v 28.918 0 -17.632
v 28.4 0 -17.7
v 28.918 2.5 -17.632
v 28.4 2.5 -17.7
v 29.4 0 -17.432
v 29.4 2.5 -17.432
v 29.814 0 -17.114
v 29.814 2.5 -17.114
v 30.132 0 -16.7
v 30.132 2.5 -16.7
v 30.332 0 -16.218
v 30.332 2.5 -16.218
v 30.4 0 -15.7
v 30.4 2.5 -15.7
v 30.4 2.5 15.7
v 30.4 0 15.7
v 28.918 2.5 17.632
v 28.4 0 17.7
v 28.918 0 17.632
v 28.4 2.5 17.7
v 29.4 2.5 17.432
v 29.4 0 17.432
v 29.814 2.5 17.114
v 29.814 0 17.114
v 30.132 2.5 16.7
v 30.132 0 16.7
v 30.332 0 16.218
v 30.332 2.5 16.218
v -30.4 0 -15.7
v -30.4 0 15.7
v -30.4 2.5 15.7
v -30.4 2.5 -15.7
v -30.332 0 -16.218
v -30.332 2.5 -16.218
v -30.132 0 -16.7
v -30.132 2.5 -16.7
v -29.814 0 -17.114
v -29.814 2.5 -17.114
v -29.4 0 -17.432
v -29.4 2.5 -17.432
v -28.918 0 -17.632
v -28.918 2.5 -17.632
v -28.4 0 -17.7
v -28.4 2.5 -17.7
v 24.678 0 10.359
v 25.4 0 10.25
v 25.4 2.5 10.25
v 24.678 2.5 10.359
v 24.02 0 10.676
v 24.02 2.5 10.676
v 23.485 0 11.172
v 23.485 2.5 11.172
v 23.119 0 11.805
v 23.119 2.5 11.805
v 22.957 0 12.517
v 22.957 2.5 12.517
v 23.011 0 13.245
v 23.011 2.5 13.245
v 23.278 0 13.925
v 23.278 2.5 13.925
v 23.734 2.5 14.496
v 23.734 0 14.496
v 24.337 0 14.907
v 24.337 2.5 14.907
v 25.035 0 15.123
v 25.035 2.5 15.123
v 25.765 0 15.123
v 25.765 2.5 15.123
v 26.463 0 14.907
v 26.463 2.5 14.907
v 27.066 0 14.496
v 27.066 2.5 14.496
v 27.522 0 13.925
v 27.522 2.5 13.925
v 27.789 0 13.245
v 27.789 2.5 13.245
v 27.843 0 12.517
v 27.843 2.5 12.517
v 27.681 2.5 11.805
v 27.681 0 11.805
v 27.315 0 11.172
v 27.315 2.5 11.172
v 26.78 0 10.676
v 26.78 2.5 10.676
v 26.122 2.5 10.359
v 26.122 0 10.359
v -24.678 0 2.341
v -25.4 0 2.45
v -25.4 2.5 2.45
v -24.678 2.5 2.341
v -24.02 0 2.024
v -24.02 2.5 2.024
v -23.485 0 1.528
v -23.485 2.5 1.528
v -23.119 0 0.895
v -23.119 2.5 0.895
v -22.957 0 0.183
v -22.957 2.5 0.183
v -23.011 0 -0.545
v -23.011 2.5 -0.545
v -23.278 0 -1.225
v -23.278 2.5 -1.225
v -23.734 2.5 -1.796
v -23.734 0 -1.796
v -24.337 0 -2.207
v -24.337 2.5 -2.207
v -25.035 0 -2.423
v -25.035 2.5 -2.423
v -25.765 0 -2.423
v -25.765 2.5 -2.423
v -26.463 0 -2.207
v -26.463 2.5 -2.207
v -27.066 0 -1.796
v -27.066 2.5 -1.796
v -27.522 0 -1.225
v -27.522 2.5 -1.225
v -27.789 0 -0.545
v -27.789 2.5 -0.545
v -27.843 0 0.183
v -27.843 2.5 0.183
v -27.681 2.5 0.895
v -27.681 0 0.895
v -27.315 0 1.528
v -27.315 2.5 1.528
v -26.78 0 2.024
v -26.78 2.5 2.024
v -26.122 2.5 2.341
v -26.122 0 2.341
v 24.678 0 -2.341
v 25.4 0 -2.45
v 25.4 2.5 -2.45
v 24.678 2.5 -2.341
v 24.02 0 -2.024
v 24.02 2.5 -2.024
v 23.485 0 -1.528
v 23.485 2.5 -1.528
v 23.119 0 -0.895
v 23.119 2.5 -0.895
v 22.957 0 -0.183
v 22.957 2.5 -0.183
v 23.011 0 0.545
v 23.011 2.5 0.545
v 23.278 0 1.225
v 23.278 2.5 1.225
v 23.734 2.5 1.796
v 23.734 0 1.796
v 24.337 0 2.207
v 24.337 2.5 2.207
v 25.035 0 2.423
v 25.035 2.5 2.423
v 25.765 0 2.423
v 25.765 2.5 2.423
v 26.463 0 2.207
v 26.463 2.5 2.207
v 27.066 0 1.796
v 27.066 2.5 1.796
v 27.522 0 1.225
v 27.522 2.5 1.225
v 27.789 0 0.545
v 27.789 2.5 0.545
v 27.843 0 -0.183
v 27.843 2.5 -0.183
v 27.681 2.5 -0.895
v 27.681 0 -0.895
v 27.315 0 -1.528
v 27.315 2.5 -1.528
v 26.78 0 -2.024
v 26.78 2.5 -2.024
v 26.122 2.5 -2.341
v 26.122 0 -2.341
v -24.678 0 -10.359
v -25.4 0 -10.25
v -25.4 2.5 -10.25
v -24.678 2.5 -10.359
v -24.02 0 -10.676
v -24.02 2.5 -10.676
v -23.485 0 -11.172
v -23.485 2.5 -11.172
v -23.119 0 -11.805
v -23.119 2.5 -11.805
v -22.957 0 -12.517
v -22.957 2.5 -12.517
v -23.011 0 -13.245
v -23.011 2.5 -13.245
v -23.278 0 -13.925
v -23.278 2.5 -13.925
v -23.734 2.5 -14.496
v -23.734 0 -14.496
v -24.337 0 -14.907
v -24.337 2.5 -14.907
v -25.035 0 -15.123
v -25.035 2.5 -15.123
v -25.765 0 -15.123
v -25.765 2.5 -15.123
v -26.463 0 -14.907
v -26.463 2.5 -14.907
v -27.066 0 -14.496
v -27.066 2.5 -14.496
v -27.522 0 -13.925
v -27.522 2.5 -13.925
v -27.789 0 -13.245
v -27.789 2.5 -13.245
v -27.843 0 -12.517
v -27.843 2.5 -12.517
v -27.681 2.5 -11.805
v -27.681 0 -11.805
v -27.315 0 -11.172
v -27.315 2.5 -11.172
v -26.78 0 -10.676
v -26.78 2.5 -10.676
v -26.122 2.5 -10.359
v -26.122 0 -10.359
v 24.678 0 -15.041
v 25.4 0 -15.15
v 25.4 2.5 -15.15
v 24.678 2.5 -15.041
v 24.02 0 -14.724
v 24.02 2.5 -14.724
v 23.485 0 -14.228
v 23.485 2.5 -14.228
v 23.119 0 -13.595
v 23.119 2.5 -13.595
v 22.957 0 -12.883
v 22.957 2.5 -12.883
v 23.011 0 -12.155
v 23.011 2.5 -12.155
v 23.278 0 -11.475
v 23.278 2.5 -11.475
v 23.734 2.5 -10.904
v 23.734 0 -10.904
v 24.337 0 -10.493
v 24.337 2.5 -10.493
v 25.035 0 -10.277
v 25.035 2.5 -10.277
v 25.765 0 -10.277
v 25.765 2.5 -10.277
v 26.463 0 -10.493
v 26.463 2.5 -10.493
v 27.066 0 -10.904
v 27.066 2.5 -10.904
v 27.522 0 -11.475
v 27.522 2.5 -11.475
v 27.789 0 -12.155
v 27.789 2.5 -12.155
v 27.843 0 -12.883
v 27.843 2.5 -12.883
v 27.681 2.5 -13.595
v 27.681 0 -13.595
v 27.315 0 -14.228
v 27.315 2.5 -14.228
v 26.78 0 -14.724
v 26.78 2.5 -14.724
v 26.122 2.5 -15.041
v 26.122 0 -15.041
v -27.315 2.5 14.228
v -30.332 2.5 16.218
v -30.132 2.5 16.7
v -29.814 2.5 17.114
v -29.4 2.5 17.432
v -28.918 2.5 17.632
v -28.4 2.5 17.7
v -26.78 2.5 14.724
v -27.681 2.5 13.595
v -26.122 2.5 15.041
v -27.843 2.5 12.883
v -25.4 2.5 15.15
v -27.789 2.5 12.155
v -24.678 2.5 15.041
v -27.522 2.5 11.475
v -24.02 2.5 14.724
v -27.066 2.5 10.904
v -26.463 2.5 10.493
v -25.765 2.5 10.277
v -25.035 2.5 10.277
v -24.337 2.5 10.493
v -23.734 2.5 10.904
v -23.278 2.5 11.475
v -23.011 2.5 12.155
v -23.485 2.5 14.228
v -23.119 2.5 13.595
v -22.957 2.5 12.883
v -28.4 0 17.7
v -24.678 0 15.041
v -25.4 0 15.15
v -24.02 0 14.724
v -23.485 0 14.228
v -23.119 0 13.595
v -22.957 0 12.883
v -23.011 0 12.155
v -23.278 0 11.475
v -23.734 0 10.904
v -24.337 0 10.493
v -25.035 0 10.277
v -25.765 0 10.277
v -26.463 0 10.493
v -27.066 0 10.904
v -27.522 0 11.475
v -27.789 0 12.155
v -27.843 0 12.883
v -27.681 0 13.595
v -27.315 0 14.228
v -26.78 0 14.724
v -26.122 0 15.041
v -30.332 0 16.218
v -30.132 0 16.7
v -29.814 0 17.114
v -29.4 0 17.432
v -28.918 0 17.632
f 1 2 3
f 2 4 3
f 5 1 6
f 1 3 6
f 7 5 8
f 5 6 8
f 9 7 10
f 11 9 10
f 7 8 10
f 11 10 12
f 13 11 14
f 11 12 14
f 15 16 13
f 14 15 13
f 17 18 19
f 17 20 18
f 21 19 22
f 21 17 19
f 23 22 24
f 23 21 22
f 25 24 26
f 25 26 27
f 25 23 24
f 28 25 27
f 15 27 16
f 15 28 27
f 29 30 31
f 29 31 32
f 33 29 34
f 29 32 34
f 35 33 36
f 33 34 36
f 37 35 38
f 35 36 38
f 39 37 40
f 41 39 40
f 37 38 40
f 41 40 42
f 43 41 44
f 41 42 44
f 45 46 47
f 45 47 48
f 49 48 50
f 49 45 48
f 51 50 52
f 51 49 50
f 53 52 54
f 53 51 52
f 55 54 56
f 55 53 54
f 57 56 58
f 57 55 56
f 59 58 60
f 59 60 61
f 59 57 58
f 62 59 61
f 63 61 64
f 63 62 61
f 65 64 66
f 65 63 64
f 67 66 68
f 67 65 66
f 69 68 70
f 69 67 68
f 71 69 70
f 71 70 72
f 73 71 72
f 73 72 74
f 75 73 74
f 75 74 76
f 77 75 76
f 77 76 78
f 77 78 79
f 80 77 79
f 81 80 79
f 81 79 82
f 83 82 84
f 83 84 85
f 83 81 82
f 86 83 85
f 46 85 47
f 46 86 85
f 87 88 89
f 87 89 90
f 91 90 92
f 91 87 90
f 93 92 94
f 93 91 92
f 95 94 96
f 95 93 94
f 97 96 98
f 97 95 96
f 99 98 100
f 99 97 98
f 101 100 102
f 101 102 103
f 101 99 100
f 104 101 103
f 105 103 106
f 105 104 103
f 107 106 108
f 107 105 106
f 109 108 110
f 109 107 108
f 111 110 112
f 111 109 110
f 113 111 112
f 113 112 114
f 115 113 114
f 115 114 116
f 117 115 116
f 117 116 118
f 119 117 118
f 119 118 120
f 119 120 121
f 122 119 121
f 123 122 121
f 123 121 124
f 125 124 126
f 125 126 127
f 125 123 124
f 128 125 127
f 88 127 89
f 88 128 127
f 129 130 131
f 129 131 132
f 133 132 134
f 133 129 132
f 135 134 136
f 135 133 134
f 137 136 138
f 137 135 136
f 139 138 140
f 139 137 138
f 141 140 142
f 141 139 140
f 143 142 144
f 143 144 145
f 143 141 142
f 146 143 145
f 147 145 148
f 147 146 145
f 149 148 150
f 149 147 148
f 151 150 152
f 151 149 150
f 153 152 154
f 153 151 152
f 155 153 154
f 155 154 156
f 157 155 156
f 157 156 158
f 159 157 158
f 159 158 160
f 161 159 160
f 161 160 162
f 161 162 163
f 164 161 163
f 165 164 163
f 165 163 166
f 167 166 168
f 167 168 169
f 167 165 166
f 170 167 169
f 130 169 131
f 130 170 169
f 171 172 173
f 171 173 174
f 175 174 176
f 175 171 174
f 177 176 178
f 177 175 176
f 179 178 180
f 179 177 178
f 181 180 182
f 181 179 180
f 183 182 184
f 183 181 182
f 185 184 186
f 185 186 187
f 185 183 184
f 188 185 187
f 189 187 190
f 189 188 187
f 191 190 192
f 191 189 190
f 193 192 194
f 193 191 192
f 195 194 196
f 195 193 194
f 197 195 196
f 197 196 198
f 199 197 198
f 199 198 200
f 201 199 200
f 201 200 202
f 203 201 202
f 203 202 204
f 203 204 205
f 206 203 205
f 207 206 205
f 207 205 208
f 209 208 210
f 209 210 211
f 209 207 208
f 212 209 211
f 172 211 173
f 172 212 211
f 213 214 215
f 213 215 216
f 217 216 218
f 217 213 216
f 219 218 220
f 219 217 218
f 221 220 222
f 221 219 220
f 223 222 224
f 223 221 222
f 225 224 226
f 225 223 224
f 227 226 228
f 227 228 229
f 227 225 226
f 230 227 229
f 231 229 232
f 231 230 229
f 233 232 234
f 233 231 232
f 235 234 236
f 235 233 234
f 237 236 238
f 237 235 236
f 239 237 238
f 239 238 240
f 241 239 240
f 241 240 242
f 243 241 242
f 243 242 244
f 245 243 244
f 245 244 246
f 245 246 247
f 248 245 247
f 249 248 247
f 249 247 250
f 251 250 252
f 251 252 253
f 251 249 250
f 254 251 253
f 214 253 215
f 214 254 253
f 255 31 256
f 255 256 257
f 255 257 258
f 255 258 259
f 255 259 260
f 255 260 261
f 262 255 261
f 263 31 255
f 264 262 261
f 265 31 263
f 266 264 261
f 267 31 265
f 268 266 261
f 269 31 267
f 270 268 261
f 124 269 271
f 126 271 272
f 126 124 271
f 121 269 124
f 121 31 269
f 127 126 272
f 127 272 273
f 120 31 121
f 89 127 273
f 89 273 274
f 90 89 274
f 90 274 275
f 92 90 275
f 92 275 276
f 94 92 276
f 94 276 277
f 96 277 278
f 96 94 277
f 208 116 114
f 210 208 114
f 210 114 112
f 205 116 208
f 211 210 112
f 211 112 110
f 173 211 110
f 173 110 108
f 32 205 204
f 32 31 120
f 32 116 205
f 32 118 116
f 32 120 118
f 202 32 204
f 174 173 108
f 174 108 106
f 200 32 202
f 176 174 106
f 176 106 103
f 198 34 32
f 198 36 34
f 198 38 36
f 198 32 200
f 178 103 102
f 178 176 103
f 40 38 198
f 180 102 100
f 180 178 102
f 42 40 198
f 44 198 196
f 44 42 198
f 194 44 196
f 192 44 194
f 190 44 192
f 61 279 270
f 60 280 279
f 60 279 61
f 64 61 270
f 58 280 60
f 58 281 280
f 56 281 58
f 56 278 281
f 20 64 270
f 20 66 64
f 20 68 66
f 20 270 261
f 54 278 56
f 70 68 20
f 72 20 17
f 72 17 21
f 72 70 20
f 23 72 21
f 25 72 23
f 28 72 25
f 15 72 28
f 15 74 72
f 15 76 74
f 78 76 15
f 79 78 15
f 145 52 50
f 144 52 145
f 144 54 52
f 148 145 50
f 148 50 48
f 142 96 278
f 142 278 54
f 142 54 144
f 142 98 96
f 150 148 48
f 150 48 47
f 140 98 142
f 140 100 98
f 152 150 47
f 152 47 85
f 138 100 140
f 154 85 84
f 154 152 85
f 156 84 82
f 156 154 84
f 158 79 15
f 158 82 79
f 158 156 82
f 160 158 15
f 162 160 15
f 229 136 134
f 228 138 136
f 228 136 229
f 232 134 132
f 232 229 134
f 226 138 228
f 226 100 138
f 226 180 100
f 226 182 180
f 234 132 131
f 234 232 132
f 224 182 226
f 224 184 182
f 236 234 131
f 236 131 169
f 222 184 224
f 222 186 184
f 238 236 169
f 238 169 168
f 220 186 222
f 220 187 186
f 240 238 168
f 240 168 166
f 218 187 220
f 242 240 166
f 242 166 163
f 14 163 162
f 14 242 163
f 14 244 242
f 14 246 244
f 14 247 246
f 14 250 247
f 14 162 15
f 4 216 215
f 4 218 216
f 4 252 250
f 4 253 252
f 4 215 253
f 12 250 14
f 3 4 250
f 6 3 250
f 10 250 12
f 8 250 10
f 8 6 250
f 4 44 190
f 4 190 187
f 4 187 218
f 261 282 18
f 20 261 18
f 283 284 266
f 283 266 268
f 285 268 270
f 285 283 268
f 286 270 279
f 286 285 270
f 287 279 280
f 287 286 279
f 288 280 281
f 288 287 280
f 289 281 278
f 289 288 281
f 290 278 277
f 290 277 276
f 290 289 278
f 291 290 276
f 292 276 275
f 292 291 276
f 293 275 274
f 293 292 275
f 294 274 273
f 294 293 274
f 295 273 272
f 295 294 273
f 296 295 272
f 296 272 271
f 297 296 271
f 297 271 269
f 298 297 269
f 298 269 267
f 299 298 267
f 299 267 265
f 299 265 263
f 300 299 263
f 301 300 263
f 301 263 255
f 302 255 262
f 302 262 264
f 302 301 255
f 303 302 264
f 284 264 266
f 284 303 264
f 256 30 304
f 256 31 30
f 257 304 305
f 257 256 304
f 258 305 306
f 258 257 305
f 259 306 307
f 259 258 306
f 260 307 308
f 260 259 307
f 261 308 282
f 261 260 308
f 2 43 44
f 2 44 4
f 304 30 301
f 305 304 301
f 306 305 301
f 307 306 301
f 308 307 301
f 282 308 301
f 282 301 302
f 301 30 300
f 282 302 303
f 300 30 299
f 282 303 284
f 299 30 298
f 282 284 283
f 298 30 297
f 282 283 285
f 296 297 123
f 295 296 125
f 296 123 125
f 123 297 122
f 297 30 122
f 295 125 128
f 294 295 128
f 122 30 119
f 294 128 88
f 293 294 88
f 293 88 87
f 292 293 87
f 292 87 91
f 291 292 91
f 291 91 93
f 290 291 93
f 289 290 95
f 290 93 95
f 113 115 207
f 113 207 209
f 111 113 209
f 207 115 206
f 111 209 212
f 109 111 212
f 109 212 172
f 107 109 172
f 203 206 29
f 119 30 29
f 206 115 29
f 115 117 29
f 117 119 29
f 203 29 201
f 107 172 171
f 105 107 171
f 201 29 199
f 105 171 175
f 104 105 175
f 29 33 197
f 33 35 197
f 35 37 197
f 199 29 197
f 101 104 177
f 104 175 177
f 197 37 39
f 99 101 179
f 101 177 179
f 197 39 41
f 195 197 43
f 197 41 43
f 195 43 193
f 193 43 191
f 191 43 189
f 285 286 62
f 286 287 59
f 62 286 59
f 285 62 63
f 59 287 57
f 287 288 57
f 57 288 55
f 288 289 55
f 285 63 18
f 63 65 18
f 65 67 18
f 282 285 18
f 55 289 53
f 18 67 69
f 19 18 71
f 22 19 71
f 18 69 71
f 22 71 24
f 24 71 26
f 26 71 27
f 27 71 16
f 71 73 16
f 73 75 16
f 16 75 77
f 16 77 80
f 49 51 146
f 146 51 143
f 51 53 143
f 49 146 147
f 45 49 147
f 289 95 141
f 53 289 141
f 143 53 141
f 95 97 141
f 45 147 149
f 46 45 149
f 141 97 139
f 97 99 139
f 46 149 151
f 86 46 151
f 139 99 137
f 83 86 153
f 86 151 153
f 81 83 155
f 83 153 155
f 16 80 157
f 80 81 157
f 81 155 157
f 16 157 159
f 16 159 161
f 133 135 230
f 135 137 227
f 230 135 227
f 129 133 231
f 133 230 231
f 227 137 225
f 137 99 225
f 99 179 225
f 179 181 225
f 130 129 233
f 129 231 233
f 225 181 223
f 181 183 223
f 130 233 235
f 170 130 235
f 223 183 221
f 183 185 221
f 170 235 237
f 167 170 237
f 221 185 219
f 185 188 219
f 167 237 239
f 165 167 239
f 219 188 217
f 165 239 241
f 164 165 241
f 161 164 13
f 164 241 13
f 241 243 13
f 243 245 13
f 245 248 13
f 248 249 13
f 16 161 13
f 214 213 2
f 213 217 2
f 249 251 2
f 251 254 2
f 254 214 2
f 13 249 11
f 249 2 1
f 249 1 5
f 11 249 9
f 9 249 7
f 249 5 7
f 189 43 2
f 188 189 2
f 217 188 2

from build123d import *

# Parameters (mm, degrees)
CROQUIS1_W              = 60.8
CROQUIS1_H              = 35.4
CROQUIS1_R              = 2.45
SALIENTE_EXTRUIR1_DEPTH = 2.5
REDONDEO1_R             = 2


with BuildPart() as part:
    # Croquis1 → Saliente-Extruir1 (new body)
    with BuildSketch(Plane(origin=(0, 0, 0), x_dir=(1, 0, 0), z_dir=(0, 1, 0))):
        Rectangle(CROQUIS1_W, CROQUIS1_H)
        with Locations(Location((-25.4, 12.7, 0), (0, 0, 270))):
            Circle(CROQUIS1_R, mode=Mode.SUBTRACT)
        with Locations(Location((-25.4, 0, 0), (0, 0, 270))):
            Circle(CROQUIS1_R, mode=Mode.SUBTRACT)
        with Locations(Location((-25.4, -12.7, 0), (0, 0, 270))):
            Circle(CROQUIS1_R, mode=Mode.SUBTRACT)
        with Locations(Location((25.4, -12.7, 0), (0, 0, 90))):
            Circle(CROQUIS1_R, mode=Mode.SUBTRACT)
        with Locations(Location((25.4, 0, 0), (0, 0, 90))):
            Circle(CROQUIS1_R, mode=Mode.SUBTRACT)
        with Locations(Location((25.4, 12.7, 0), (0, 0, 90))):
            Circle(CROQUIS1_R, mode=Mode.SUBTRACT)
    extrude(amount=SALIENTE_EXTRUIR1_DEPTH)

    # Redondeo1
    redondeo1_edges = [part.edges().sort_by_distance(p)[0] for p in [
        (30.4, 1.25, 17.7),
        (-30.4, 1.25, 17.7),
        (-30.4, 1.25, -17.7),
        (30.4, 1.25, -17.7),
    ]]
    fillet(redondeo1_edges, radius=REDONDEO1_R)


solid = part.part
